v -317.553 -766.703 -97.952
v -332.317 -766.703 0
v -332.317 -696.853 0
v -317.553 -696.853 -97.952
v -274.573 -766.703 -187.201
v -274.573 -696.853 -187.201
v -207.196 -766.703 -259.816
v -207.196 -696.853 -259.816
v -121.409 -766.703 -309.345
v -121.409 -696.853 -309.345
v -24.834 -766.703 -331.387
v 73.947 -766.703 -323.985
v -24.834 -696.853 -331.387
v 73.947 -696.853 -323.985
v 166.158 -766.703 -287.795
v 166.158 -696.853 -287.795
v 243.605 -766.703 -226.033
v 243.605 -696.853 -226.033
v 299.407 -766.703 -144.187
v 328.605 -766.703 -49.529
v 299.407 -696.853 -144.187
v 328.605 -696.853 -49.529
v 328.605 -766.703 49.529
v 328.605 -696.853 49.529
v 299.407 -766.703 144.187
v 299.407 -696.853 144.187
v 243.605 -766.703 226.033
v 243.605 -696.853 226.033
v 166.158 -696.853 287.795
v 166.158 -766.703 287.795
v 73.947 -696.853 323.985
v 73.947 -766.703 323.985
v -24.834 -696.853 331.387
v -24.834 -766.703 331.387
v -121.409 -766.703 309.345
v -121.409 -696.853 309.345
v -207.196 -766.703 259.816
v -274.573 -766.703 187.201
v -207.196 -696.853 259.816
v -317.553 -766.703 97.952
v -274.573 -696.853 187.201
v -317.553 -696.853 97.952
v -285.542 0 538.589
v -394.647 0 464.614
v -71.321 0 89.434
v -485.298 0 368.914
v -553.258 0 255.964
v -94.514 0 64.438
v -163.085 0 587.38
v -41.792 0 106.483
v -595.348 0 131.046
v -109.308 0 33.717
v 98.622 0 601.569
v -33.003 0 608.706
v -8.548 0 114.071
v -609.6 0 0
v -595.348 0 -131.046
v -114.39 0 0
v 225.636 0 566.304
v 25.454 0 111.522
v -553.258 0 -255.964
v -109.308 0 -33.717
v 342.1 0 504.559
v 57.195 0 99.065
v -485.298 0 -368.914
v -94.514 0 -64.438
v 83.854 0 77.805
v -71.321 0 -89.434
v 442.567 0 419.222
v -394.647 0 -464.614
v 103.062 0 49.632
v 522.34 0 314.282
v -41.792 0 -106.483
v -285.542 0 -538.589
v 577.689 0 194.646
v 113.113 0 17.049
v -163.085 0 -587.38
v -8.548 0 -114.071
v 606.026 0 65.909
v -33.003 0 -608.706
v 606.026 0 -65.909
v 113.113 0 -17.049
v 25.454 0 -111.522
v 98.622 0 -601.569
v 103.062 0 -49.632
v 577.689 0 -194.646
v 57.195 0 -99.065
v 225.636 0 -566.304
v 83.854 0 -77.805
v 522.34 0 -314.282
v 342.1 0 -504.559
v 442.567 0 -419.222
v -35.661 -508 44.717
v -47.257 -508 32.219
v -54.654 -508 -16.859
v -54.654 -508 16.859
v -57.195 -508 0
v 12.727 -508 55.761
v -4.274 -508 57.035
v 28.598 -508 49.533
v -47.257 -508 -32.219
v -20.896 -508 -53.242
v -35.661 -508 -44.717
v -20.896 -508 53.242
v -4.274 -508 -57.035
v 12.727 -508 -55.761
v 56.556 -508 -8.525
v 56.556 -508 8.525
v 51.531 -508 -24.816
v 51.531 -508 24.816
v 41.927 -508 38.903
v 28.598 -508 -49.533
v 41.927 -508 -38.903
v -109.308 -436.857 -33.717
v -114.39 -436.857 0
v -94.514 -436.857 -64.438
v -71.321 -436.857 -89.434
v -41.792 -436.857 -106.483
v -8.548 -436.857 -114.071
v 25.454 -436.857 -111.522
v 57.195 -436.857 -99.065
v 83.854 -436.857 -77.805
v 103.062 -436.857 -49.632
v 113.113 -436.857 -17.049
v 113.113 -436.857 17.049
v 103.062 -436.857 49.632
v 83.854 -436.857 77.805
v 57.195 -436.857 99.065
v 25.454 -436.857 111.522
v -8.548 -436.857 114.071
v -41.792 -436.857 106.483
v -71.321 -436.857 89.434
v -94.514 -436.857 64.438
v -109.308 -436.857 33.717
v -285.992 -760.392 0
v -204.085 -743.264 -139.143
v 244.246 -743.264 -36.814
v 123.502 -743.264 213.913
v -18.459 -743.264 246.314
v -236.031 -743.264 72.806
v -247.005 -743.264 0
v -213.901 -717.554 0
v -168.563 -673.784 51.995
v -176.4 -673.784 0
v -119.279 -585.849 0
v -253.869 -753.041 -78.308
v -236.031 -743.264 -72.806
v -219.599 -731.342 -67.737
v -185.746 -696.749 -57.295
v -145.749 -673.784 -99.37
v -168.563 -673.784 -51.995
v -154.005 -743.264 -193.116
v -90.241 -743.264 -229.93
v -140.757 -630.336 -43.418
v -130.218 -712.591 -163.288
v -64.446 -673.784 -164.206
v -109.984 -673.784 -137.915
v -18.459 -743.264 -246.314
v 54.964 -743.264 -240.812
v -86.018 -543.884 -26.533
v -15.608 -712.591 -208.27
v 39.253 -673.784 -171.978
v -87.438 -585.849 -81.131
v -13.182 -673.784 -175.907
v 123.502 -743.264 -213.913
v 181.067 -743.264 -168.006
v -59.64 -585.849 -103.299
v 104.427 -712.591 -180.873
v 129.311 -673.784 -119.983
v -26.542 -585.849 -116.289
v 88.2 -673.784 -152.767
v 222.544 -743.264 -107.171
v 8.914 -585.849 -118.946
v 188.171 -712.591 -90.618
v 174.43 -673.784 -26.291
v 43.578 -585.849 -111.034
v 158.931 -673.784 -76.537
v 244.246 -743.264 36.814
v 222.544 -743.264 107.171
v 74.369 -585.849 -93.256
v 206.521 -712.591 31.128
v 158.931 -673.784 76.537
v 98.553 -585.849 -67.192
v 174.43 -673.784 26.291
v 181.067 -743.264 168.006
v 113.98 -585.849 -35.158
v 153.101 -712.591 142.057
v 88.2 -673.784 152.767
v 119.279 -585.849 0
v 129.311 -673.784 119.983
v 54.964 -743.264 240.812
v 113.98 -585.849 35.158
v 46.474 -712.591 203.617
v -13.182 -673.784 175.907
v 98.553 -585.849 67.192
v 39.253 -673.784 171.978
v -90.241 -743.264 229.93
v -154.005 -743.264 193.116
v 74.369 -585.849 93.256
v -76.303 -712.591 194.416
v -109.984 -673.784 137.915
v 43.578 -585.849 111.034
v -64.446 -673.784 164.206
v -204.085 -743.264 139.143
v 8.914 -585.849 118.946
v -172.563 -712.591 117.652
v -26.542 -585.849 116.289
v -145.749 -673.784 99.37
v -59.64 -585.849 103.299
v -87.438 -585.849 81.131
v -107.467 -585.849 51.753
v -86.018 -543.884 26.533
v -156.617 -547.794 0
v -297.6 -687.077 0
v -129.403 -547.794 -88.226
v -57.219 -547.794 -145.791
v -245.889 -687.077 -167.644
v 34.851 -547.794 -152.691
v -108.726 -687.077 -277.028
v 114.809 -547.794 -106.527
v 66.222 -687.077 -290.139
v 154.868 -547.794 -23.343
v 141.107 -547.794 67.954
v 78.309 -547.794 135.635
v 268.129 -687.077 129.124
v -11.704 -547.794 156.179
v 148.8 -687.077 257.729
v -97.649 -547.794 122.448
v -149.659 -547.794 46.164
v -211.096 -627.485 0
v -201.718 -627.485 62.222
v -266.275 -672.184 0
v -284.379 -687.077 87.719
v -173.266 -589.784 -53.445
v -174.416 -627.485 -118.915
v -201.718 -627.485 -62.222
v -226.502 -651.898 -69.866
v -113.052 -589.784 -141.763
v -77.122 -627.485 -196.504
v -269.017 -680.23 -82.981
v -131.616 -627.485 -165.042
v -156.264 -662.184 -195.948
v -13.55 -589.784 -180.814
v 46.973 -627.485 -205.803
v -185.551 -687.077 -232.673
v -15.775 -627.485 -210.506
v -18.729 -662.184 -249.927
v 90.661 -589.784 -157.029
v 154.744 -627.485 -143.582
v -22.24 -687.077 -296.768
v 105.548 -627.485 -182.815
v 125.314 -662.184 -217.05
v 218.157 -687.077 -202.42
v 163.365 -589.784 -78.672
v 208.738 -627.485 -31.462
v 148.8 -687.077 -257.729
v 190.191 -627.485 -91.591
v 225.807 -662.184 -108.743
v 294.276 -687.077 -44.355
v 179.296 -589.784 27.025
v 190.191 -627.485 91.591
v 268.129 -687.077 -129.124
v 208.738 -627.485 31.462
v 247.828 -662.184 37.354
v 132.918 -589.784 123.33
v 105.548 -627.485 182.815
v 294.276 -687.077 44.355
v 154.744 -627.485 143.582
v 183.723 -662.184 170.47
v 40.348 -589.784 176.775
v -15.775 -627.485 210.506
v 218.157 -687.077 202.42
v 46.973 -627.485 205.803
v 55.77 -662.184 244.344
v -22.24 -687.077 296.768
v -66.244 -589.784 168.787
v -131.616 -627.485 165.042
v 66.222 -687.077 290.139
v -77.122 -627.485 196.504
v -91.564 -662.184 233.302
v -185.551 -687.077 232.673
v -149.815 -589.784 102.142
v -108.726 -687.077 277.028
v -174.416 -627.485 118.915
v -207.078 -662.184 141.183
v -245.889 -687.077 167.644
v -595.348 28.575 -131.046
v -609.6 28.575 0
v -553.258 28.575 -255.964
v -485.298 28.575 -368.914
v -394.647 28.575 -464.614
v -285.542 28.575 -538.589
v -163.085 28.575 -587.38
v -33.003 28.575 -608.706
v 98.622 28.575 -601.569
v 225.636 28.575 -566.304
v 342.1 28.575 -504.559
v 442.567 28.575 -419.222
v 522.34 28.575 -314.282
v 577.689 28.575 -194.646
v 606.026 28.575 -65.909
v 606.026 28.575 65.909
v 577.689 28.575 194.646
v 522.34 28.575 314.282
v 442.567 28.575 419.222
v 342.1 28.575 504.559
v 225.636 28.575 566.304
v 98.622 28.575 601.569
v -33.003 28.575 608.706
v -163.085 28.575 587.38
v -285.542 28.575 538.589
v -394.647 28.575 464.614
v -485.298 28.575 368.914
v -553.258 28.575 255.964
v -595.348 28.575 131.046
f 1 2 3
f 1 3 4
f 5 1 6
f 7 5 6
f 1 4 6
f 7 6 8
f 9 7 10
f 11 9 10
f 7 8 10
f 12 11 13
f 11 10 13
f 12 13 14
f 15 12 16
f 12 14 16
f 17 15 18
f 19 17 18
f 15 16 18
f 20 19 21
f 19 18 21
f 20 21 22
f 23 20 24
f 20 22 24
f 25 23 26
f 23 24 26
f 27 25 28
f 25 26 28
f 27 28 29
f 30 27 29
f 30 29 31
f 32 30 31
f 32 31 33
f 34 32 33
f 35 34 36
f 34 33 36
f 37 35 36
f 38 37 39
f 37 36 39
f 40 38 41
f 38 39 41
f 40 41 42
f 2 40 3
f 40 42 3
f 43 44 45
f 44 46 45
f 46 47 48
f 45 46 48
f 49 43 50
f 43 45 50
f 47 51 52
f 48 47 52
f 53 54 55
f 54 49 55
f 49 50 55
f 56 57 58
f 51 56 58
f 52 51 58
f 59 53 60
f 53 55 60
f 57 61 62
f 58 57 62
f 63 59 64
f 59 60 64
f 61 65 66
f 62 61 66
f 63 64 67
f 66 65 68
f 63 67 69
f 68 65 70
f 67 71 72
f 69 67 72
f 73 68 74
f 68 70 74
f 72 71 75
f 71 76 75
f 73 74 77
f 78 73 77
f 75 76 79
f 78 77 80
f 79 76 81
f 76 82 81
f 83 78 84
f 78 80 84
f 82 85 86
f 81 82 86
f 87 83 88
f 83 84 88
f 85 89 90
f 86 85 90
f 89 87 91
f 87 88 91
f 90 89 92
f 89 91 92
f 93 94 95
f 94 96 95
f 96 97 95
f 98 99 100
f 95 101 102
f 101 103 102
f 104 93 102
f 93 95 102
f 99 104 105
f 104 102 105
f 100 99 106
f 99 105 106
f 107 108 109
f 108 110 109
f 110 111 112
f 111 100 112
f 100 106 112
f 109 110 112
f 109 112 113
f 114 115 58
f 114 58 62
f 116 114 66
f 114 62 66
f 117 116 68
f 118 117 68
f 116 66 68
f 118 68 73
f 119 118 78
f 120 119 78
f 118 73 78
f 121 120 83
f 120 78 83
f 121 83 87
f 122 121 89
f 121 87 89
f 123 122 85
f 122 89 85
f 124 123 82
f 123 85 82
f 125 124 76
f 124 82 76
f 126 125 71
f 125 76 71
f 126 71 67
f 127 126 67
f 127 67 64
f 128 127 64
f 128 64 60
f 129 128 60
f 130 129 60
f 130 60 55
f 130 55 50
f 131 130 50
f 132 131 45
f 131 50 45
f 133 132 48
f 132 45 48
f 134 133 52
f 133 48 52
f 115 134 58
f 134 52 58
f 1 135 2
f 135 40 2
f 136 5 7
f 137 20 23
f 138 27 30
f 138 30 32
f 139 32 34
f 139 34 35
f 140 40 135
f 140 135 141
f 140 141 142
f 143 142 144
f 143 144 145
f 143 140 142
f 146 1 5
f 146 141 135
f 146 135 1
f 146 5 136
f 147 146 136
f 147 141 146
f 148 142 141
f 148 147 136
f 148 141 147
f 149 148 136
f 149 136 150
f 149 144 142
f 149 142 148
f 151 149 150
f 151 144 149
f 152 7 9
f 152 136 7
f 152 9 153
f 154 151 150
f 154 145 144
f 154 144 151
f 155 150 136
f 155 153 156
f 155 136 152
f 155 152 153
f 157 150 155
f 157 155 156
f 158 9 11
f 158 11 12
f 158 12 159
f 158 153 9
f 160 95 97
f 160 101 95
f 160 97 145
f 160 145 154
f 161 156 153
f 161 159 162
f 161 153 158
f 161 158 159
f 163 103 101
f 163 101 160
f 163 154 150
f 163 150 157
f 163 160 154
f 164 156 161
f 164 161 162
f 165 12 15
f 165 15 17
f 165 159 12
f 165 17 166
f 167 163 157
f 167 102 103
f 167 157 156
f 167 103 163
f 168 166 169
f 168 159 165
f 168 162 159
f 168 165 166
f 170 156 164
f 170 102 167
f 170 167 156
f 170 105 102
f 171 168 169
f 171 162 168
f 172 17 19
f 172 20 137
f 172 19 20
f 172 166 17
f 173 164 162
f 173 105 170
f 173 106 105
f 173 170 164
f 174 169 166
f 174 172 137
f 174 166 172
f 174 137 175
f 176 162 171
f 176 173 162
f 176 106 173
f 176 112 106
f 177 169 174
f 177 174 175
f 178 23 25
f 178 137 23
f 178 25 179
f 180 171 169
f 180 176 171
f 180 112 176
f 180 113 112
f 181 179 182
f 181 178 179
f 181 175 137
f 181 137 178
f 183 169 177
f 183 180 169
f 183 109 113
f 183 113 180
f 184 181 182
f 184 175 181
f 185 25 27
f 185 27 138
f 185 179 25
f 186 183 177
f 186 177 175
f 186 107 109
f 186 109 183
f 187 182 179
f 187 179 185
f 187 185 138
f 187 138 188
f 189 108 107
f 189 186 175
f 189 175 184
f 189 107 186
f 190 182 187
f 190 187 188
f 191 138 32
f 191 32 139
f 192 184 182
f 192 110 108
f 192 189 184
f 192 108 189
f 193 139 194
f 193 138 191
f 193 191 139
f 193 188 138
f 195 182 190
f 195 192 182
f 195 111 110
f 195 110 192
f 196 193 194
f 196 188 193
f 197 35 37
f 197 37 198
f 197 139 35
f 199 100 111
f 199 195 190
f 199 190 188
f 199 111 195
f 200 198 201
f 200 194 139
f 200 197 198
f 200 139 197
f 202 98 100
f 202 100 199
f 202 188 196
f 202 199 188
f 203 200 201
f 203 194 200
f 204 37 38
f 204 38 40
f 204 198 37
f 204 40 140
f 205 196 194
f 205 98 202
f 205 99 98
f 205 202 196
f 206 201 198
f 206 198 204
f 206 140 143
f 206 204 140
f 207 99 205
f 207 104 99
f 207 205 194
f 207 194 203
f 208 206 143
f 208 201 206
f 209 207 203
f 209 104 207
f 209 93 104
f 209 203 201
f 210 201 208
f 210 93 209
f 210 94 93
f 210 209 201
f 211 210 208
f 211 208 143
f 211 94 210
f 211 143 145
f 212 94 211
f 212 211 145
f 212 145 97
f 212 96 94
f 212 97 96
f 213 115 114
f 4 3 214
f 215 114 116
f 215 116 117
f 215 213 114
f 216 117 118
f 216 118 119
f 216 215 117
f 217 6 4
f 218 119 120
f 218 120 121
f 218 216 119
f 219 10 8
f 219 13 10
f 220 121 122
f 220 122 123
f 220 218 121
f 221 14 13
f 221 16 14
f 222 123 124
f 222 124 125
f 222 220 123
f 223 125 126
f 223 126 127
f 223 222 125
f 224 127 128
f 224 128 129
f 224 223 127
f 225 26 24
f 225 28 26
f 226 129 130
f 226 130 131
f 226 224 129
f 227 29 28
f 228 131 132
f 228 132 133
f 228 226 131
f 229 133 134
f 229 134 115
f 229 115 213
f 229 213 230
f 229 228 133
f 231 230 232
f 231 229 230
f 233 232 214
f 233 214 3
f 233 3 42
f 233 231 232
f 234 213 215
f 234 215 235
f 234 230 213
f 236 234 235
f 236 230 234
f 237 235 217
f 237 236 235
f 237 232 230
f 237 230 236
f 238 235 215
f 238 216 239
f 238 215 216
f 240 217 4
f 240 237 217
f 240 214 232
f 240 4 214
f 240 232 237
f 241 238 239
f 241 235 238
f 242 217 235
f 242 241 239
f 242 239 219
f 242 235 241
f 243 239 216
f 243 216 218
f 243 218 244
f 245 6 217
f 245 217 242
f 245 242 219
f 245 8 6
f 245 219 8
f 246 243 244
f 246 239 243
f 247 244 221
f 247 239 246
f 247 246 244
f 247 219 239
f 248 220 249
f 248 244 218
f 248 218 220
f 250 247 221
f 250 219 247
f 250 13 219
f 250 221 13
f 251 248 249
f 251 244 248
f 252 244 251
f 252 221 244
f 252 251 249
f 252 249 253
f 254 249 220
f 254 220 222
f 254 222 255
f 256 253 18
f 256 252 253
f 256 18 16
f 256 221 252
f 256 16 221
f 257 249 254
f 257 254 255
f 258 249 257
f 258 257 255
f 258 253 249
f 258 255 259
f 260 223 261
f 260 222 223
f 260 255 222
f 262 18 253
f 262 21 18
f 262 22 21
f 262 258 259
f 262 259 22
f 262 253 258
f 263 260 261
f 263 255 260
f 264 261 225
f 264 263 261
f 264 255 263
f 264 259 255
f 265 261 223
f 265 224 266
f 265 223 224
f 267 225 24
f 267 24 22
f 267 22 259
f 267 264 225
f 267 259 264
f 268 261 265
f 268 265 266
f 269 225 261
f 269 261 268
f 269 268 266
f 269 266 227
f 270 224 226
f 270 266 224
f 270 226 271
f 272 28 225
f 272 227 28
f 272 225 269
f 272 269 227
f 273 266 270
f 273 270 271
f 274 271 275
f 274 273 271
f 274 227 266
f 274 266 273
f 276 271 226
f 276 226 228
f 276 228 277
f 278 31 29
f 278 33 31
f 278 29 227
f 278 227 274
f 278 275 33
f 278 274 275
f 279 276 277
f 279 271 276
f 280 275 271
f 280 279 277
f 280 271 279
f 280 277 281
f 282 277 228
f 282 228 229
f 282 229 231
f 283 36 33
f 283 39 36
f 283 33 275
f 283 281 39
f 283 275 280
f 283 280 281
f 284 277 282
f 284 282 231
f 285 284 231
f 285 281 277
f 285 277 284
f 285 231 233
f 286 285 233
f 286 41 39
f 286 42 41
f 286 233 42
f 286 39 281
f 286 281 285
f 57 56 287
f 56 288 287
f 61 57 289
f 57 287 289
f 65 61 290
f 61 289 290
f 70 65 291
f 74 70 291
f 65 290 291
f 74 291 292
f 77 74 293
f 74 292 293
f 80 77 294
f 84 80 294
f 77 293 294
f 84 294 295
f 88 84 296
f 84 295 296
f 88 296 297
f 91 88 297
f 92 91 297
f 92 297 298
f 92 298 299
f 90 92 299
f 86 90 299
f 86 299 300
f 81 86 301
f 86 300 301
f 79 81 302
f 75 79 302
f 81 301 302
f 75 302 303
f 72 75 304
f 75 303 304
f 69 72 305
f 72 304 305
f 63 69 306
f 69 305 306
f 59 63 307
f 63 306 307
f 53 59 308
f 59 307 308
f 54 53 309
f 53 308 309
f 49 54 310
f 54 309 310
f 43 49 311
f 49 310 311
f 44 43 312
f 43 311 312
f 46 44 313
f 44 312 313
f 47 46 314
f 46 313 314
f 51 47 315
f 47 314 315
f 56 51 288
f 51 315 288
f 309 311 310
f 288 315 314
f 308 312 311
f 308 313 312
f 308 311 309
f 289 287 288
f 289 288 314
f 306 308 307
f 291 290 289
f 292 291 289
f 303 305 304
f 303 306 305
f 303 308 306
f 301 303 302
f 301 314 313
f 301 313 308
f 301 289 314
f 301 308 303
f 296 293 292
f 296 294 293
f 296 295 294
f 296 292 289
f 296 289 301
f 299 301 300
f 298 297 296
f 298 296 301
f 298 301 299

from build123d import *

# Parameters (mm, degrees)
SKETCH2_W = 609.6
SKETCH2_H = 28.575


with BuildPart() as part:
    # Sketch2 → Revolve1 (revolve)
    with BuildSketch(Plane.XY, mode=Mode.PRIVATE) as revolve1_sk:
        Polygon((114.390414377, 0), (0, 0), (0, -508), (57.195207189, -508), (114.390414377, -508), (114.390414377, -436.856929751), align=None)
        with Locations((304.8, 14.2875)):
            Rectangle(SKETCH2_W, SKETCH2_H)
        with BuildLine():
            add(Edge.make_bspline(
                [(114.390414377, -436.856929751), (144.884830942, -546.818476347), (207.101707678, -672.816275805), (332.316500716, -696.853289197)],
                knots=[0, 0, 0, 0, 1, 1, 1, 1], degree=3))
            Line((114.390414377, -436.856929751), (114.390414377, -508))
            Line((114.390414377, -508), (57.195207189, -508))
            add(Edge.make_bspline(
                [(332.316500716, -766.703289197), (180.787832632, -766.227742439), (148.104498186, -589.357090779), (57.195207189, -508)],
                knots=[0, 0, 0, 0, 1, 1, 1, 1], degree=3))
            Line((332.316500716, -766.703289197), (332.316500716, -696.853289197))
        make_face()
    revolve(revolve1_sk.sketch.rotate(Axis((0, 0, 0), (0, -1, 0)), 180), axis=Axis((0, 0, 0), (0, -1, 0)))


solid = part.part
